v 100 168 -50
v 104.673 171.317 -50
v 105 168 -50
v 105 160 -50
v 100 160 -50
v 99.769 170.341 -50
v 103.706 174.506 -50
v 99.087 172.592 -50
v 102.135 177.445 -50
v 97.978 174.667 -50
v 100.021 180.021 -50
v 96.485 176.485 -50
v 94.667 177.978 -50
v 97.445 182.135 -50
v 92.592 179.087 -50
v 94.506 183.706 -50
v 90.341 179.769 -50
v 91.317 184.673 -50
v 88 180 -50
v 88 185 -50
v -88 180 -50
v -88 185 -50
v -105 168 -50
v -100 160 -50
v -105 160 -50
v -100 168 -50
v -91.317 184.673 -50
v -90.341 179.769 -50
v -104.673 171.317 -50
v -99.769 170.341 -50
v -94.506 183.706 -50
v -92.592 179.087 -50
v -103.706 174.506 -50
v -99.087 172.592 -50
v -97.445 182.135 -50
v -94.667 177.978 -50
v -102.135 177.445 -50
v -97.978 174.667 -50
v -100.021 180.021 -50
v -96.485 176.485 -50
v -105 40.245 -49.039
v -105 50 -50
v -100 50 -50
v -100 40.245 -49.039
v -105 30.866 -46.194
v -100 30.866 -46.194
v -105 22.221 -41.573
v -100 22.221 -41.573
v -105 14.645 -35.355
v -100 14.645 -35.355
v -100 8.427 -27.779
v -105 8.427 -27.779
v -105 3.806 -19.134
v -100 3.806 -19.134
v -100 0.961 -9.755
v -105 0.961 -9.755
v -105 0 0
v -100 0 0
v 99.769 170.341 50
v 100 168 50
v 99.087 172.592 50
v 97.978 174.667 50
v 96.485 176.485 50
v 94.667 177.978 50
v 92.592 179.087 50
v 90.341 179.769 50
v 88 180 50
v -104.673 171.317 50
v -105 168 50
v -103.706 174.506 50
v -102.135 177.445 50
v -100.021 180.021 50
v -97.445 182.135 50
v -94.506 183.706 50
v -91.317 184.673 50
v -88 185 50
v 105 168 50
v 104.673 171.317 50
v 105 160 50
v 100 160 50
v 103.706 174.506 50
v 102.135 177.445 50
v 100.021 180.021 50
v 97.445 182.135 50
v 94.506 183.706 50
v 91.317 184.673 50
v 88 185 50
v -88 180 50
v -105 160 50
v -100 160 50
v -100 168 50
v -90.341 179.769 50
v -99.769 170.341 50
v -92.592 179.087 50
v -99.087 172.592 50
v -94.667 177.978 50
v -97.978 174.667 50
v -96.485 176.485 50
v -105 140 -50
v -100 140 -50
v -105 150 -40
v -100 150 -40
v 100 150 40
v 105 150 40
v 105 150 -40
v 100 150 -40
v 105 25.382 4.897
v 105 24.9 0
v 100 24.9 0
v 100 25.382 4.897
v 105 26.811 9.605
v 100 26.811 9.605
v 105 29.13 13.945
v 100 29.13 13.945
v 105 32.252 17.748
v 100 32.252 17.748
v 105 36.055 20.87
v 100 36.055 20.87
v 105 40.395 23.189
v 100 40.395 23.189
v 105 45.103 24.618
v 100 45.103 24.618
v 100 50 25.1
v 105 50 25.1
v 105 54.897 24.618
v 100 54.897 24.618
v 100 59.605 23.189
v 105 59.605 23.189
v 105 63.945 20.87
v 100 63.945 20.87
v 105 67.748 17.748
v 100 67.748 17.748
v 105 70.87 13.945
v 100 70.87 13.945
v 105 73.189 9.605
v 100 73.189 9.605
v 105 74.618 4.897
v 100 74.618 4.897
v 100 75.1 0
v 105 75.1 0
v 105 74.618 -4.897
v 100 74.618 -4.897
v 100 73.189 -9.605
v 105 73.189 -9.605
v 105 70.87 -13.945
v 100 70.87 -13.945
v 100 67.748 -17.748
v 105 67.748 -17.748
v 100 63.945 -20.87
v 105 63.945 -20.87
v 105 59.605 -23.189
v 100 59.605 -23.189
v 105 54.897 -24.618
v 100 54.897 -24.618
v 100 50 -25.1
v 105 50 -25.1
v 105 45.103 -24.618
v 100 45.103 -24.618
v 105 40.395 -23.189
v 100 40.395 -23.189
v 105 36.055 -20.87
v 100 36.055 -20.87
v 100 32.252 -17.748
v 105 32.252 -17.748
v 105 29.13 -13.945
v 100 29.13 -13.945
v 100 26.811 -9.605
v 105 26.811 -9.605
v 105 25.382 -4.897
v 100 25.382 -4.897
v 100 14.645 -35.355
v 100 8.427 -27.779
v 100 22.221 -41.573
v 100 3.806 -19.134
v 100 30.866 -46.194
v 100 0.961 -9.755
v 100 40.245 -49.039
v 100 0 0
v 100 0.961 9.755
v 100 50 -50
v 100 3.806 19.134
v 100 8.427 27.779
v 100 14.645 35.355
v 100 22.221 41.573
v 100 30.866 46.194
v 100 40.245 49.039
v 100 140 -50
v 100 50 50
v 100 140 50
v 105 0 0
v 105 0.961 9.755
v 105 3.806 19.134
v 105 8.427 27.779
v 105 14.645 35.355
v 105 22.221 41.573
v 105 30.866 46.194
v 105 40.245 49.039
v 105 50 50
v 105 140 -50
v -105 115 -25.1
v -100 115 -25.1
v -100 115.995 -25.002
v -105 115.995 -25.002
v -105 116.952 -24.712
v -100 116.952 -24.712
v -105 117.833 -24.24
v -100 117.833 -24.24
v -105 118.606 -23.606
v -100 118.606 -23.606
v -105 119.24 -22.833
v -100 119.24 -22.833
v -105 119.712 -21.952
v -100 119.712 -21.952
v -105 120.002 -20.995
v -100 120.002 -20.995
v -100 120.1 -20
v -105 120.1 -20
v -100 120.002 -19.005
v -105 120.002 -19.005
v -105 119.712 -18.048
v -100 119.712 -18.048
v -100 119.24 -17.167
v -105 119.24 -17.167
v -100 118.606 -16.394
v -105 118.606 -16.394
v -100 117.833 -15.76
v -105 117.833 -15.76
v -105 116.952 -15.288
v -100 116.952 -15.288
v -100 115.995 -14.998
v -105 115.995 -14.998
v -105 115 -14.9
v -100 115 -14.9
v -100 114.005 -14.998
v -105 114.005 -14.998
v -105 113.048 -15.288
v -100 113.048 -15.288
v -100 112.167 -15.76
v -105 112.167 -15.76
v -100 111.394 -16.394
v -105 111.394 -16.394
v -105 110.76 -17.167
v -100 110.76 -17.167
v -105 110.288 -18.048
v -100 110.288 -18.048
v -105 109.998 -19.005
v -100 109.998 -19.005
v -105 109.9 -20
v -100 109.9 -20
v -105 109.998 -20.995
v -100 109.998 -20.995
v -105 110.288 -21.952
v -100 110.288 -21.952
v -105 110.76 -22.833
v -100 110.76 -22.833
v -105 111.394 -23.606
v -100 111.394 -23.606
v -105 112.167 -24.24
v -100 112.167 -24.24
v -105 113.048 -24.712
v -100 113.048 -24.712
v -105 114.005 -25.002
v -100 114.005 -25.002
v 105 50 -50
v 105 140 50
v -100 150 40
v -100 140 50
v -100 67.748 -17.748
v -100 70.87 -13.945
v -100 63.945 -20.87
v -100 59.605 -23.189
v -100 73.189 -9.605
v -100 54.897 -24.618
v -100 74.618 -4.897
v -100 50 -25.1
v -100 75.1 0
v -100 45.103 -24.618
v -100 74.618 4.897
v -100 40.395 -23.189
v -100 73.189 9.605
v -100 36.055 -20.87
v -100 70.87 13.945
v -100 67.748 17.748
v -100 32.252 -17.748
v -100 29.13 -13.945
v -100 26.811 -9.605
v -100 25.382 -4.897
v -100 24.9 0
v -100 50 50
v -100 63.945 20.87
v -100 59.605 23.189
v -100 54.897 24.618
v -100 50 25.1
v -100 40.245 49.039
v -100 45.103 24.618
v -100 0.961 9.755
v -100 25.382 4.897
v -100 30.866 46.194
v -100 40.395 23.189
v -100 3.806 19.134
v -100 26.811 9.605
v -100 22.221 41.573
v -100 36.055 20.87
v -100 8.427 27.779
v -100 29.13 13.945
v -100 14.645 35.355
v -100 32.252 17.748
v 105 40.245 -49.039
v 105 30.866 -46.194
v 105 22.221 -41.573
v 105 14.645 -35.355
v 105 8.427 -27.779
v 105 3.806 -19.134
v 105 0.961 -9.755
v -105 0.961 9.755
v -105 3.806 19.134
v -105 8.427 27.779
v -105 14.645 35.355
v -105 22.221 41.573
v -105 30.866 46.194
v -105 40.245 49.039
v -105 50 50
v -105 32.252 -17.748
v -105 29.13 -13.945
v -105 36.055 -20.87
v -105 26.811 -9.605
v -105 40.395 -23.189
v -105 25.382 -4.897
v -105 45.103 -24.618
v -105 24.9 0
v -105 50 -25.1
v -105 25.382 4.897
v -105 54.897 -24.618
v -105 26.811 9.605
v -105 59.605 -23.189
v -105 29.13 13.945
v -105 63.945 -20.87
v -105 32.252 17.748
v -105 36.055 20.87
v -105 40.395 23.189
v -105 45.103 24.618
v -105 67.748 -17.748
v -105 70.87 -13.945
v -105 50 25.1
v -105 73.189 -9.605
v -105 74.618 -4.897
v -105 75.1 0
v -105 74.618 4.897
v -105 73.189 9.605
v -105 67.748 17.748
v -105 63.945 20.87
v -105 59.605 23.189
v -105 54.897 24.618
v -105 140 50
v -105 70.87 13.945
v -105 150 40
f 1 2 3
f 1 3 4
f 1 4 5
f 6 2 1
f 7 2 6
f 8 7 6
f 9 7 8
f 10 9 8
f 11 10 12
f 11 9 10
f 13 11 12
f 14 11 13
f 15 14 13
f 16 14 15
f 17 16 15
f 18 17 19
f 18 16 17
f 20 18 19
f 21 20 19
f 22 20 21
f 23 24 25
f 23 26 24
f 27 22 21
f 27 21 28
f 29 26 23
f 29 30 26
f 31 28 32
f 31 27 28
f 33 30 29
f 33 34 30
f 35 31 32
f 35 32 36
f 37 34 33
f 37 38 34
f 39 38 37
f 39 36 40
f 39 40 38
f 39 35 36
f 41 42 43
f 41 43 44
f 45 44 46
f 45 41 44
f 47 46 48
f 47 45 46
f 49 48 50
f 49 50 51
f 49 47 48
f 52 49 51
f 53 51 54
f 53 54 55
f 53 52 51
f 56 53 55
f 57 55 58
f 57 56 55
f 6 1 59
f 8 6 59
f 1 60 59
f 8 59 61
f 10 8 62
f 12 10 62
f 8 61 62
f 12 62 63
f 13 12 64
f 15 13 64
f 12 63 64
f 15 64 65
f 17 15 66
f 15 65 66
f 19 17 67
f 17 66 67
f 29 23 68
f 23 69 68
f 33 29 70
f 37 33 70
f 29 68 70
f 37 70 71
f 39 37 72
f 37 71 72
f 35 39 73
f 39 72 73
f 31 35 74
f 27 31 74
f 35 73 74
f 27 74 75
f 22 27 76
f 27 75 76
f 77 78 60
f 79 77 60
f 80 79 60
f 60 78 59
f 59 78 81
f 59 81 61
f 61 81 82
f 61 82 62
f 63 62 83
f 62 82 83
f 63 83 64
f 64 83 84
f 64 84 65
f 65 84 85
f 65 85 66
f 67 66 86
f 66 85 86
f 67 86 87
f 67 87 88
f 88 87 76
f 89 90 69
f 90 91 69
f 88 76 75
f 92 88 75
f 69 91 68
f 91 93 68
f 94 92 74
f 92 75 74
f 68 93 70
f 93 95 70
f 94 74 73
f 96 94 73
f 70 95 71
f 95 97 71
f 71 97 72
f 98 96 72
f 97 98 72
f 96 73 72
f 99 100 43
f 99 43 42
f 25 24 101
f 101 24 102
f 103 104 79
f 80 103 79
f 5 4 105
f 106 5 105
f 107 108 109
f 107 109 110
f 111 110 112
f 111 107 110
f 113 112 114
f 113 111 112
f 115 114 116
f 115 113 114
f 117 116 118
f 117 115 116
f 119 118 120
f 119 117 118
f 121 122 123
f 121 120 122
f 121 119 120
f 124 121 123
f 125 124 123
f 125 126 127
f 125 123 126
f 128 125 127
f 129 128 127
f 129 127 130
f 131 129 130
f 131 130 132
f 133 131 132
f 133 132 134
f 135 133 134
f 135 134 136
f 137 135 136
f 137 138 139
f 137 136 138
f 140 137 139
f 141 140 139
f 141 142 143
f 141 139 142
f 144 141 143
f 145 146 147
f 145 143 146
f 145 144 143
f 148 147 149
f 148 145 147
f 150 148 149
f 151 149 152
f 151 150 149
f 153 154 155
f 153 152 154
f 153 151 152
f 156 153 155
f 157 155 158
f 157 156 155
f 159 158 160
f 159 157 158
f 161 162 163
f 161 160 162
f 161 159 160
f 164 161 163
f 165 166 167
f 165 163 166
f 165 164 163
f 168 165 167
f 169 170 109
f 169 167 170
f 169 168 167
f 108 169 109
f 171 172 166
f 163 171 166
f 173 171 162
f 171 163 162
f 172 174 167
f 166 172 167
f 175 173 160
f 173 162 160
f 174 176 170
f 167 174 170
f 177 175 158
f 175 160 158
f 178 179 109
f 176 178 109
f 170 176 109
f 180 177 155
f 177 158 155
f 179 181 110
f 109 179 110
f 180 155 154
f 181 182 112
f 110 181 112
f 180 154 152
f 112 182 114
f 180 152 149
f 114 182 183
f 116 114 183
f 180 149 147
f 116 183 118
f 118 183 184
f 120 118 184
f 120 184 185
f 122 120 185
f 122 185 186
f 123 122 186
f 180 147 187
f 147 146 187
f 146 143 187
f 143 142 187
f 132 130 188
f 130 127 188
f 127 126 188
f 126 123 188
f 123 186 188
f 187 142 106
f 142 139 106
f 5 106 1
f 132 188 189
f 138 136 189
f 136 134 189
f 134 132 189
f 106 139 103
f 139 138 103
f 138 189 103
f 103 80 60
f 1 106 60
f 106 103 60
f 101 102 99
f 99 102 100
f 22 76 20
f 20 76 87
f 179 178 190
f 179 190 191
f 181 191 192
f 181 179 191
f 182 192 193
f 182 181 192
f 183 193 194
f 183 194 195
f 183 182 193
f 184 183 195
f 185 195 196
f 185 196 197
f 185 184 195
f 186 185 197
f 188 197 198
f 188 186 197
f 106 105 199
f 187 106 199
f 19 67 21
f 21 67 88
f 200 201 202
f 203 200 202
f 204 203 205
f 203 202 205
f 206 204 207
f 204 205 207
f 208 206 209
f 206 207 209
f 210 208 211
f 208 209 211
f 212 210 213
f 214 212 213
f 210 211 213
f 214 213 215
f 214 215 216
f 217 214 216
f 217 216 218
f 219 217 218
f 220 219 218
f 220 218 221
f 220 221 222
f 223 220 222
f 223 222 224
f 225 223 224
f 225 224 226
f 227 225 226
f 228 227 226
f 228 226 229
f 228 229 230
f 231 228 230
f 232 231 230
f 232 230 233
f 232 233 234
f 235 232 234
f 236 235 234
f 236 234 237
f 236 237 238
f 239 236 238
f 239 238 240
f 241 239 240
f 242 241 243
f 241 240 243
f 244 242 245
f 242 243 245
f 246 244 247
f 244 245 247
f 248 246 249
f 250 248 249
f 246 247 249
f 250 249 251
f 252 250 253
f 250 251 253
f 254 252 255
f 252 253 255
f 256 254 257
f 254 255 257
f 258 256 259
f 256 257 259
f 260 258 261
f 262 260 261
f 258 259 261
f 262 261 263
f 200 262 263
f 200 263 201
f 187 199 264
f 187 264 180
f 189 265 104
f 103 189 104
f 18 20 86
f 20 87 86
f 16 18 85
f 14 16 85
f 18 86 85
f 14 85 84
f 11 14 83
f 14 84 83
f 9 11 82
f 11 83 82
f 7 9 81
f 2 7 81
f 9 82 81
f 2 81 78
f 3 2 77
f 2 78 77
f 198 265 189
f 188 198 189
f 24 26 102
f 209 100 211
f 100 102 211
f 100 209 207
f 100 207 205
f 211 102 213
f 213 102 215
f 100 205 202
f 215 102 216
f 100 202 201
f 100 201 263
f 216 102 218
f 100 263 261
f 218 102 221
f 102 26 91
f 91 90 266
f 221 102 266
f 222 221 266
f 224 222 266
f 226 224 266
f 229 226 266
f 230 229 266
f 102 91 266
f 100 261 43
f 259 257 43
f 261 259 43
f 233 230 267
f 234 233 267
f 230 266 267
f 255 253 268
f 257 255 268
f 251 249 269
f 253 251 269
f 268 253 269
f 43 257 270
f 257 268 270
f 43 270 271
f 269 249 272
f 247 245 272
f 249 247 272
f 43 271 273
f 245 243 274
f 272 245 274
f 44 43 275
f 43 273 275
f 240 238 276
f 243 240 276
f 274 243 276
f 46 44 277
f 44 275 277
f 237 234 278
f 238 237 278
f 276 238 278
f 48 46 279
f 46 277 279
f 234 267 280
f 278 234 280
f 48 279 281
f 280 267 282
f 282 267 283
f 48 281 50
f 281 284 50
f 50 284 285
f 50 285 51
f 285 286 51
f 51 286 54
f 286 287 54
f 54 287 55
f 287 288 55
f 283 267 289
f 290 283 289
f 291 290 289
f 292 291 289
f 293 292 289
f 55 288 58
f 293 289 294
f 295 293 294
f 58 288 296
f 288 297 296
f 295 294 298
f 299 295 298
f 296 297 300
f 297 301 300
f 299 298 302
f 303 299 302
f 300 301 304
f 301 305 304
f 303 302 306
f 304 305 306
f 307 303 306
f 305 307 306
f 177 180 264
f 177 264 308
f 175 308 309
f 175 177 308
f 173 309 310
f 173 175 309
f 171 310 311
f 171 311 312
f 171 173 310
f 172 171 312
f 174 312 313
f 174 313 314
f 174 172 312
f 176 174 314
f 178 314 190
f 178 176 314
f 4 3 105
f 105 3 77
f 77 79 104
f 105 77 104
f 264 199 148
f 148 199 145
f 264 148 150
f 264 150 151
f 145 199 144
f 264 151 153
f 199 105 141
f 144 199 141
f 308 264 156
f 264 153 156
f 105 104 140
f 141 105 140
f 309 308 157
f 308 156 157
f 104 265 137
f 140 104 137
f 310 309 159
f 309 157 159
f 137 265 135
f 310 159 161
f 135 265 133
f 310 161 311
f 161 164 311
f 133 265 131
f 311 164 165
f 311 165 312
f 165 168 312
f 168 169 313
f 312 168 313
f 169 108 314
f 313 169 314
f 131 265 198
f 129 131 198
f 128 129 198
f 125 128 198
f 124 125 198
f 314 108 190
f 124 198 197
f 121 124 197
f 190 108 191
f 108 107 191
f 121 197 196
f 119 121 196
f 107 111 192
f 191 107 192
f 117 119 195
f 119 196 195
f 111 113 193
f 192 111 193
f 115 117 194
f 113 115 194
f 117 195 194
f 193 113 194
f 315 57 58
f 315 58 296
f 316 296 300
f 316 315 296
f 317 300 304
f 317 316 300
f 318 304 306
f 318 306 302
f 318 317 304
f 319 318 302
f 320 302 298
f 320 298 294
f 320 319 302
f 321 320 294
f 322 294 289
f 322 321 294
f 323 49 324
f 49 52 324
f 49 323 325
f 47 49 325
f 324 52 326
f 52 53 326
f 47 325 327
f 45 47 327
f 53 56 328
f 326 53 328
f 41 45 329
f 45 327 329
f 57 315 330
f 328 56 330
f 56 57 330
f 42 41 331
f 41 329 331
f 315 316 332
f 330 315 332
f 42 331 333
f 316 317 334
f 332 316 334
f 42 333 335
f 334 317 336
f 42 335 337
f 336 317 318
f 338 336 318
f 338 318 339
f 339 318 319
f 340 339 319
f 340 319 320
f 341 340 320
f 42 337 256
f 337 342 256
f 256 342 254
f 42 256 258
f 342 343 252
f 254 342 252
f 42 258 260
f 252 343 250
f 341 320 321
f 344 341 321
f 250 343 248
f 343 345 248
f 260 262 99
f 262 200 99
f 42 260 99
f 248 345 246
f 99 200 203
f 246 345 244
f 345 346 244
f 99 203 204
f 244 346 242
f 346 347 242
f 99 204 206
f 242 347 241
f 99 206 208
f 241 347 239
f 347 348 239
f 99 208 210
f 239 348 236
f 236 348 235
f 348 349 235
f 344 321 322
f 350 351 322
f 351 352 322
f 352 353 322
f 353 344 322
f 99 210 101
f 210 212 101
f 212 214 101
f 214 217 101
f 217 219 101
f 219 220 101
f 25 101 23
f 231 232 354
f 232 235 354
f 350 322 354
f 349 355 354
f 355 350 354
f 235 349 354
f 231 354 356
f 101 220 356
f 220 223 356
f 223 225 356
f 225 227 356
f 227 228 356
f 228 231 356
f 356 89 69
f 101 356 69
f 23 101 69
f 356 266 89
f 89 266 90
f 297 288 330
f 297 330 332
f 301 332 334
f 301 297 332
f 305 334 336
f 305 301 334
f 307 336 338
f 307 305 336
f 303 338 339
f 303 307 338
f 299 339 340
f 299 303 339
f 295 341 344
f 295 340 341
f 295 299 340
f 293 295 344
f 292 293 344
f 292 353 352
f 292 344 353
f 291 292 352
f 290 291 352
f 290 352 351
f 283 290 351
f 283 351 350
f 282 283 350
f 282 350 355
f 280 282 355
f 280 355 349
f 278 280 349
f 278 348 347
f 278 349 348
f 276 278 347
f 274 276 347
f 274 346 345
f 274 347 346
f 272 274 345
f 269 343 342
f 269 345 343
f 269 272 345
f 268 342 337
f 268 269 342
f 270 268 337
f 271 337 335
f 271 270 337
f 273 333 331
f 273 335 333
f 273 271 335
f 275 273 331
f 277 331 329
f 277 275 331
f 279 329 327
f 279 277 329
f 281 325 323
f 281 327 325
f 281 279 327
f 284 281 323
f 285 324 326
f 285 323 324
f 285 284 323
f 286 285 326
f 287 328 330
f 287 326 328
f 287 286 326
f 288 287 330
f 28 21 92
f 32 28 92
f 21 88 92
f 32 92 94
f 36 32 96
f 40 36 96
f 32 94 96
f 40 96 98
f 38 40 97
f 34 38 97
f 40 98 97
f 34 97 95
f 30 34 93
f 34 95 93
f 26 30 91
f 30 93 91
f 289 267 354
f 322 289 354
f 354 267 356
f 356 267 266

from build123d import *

# Parameters (mm, degrees)
BASE_FLANGE1_DEPTH          = 50
CUT_EXTRUDE1_DEPTH          = 285.297379517
CUT_EXTRUDE1_DEPTH_BACK     = 285.297379517
M12X1_75_TAPPED_HOLE1_D     = 10.2
M12X1_75_TAPPED_HOLE1_DEPTH = 5
BREAK_CORNER2_START         = -105
BREAK_CORNER2_DEPTH         = 210
CUT_EXTRUDE2_DEPTH          = 285.297379517
CUT_EXTRUDE2_DEPTH_BACK     = 285.297379517
SKETCH10_R                  = 25.1


# Read off the part's stored shape, not the designer's step: Break-Corner2
# Sheet-metal steps are written as plain solids
with BuildPart() as part:
    # Sketch1 → Base-Flange1 (new, symmetric)
    with BuildSketch(Plane.XY):
        with BuildLine():
            Line((-105, 0), (-105, 168))
            ThreePointArc((-105, 168), (-100.02081528, 180.02081528), (-88, 185))
            Line((-88, 185), (88, 185))
            ThreePointArc((88, 185), (100.02081528, 180.02081528), (105, 168))
            Line((105, 168), (105, 0))
            Line((105, 0), (100, 0))
            Line((100, 0), (100, 168))
            ThreePointArc((100, 168), (96.485281374, 176.485281374), (88, 180))
            Line((88, 180), (-88, 180))
            ThreePointArc((-88, 180), (-96.485281374, 176.485281374), (-100, 168))
            Line((-100, 168), (-100, 0))
            Line((-100, 0), (-105, 0))
        make_face()
    extrude(amount=BASE_FLANGE1_DEPTH, both=True)

    # Sketch6 → Cut-Extrude1 (cut, two sides: drawn at the far end of the back side and taken through both)
    with BuildSketch(Plane.ZY.offset(105).offset(-CUT_EXTRUDE1_DEPTH_BACK)):
        Polygon((-50, 160), (-40, 150), (-50, 140), align=None)
        Polygon((50, 160), (50, 140), (40, 150), align=None)
    extrude(amount=CUT_EXTRUDE1_DEPTH + CUT_EXTRUDE1_DEPTH_BACK, mode=Mode.SUBTRACT)

    # M12x1.75 Tapped Hole1
    with Locations(Plane.ZY.offset(105)):
        with Locations((-20, 115)):
            Hole(M12X1_75_TAPPED_HOLE1_D / 2, depth=M12X1_75_TAPPED_HOLE1_DEPTH)

    # Break-Corner2 outline → Break-Corner2 (cut)
    with BuildSketch(Plane.YZ.offset(BREAK_CORNER2_START)):
        with BuildLine():
            Line((0, -50), (50, -50))
            ThreePointArc((50, -50), (14.644660941, -35.355339059), (0, 0))
            Line((0, 0), (0, -50))
        make_face()
        with BuildLine():
            Line((0, 50), (0, 0))
            ThreePointArc((0, 0), (14.644660941, 35.355339059), (50, 50))
            Line((50, 50), (0, 50))
        make_face()
    extrude(amount=BREAK_CORNER2_DEPTH, mode=Mode.SUBTRACT)

    # Sketch10 → Cut-Extrude2 (cut, two sides: drawn at the far end of the back side and taken through both)
    with BuildSketch(Plane.ZY.offset(105).offset(-CUT_EXTRUDE2_DEPTH_BACK)):
        with Locations(Location((0, 50, 0), (0, 0, 270))):
            Circle(SKETCH10_R)
    extrude(amount=CUT_EXTRUDE2_DEPTH + CUT_EXTRUDE2_DEPTH_BACK, mode=Mode.SUBTRACT)


solid = part.part
